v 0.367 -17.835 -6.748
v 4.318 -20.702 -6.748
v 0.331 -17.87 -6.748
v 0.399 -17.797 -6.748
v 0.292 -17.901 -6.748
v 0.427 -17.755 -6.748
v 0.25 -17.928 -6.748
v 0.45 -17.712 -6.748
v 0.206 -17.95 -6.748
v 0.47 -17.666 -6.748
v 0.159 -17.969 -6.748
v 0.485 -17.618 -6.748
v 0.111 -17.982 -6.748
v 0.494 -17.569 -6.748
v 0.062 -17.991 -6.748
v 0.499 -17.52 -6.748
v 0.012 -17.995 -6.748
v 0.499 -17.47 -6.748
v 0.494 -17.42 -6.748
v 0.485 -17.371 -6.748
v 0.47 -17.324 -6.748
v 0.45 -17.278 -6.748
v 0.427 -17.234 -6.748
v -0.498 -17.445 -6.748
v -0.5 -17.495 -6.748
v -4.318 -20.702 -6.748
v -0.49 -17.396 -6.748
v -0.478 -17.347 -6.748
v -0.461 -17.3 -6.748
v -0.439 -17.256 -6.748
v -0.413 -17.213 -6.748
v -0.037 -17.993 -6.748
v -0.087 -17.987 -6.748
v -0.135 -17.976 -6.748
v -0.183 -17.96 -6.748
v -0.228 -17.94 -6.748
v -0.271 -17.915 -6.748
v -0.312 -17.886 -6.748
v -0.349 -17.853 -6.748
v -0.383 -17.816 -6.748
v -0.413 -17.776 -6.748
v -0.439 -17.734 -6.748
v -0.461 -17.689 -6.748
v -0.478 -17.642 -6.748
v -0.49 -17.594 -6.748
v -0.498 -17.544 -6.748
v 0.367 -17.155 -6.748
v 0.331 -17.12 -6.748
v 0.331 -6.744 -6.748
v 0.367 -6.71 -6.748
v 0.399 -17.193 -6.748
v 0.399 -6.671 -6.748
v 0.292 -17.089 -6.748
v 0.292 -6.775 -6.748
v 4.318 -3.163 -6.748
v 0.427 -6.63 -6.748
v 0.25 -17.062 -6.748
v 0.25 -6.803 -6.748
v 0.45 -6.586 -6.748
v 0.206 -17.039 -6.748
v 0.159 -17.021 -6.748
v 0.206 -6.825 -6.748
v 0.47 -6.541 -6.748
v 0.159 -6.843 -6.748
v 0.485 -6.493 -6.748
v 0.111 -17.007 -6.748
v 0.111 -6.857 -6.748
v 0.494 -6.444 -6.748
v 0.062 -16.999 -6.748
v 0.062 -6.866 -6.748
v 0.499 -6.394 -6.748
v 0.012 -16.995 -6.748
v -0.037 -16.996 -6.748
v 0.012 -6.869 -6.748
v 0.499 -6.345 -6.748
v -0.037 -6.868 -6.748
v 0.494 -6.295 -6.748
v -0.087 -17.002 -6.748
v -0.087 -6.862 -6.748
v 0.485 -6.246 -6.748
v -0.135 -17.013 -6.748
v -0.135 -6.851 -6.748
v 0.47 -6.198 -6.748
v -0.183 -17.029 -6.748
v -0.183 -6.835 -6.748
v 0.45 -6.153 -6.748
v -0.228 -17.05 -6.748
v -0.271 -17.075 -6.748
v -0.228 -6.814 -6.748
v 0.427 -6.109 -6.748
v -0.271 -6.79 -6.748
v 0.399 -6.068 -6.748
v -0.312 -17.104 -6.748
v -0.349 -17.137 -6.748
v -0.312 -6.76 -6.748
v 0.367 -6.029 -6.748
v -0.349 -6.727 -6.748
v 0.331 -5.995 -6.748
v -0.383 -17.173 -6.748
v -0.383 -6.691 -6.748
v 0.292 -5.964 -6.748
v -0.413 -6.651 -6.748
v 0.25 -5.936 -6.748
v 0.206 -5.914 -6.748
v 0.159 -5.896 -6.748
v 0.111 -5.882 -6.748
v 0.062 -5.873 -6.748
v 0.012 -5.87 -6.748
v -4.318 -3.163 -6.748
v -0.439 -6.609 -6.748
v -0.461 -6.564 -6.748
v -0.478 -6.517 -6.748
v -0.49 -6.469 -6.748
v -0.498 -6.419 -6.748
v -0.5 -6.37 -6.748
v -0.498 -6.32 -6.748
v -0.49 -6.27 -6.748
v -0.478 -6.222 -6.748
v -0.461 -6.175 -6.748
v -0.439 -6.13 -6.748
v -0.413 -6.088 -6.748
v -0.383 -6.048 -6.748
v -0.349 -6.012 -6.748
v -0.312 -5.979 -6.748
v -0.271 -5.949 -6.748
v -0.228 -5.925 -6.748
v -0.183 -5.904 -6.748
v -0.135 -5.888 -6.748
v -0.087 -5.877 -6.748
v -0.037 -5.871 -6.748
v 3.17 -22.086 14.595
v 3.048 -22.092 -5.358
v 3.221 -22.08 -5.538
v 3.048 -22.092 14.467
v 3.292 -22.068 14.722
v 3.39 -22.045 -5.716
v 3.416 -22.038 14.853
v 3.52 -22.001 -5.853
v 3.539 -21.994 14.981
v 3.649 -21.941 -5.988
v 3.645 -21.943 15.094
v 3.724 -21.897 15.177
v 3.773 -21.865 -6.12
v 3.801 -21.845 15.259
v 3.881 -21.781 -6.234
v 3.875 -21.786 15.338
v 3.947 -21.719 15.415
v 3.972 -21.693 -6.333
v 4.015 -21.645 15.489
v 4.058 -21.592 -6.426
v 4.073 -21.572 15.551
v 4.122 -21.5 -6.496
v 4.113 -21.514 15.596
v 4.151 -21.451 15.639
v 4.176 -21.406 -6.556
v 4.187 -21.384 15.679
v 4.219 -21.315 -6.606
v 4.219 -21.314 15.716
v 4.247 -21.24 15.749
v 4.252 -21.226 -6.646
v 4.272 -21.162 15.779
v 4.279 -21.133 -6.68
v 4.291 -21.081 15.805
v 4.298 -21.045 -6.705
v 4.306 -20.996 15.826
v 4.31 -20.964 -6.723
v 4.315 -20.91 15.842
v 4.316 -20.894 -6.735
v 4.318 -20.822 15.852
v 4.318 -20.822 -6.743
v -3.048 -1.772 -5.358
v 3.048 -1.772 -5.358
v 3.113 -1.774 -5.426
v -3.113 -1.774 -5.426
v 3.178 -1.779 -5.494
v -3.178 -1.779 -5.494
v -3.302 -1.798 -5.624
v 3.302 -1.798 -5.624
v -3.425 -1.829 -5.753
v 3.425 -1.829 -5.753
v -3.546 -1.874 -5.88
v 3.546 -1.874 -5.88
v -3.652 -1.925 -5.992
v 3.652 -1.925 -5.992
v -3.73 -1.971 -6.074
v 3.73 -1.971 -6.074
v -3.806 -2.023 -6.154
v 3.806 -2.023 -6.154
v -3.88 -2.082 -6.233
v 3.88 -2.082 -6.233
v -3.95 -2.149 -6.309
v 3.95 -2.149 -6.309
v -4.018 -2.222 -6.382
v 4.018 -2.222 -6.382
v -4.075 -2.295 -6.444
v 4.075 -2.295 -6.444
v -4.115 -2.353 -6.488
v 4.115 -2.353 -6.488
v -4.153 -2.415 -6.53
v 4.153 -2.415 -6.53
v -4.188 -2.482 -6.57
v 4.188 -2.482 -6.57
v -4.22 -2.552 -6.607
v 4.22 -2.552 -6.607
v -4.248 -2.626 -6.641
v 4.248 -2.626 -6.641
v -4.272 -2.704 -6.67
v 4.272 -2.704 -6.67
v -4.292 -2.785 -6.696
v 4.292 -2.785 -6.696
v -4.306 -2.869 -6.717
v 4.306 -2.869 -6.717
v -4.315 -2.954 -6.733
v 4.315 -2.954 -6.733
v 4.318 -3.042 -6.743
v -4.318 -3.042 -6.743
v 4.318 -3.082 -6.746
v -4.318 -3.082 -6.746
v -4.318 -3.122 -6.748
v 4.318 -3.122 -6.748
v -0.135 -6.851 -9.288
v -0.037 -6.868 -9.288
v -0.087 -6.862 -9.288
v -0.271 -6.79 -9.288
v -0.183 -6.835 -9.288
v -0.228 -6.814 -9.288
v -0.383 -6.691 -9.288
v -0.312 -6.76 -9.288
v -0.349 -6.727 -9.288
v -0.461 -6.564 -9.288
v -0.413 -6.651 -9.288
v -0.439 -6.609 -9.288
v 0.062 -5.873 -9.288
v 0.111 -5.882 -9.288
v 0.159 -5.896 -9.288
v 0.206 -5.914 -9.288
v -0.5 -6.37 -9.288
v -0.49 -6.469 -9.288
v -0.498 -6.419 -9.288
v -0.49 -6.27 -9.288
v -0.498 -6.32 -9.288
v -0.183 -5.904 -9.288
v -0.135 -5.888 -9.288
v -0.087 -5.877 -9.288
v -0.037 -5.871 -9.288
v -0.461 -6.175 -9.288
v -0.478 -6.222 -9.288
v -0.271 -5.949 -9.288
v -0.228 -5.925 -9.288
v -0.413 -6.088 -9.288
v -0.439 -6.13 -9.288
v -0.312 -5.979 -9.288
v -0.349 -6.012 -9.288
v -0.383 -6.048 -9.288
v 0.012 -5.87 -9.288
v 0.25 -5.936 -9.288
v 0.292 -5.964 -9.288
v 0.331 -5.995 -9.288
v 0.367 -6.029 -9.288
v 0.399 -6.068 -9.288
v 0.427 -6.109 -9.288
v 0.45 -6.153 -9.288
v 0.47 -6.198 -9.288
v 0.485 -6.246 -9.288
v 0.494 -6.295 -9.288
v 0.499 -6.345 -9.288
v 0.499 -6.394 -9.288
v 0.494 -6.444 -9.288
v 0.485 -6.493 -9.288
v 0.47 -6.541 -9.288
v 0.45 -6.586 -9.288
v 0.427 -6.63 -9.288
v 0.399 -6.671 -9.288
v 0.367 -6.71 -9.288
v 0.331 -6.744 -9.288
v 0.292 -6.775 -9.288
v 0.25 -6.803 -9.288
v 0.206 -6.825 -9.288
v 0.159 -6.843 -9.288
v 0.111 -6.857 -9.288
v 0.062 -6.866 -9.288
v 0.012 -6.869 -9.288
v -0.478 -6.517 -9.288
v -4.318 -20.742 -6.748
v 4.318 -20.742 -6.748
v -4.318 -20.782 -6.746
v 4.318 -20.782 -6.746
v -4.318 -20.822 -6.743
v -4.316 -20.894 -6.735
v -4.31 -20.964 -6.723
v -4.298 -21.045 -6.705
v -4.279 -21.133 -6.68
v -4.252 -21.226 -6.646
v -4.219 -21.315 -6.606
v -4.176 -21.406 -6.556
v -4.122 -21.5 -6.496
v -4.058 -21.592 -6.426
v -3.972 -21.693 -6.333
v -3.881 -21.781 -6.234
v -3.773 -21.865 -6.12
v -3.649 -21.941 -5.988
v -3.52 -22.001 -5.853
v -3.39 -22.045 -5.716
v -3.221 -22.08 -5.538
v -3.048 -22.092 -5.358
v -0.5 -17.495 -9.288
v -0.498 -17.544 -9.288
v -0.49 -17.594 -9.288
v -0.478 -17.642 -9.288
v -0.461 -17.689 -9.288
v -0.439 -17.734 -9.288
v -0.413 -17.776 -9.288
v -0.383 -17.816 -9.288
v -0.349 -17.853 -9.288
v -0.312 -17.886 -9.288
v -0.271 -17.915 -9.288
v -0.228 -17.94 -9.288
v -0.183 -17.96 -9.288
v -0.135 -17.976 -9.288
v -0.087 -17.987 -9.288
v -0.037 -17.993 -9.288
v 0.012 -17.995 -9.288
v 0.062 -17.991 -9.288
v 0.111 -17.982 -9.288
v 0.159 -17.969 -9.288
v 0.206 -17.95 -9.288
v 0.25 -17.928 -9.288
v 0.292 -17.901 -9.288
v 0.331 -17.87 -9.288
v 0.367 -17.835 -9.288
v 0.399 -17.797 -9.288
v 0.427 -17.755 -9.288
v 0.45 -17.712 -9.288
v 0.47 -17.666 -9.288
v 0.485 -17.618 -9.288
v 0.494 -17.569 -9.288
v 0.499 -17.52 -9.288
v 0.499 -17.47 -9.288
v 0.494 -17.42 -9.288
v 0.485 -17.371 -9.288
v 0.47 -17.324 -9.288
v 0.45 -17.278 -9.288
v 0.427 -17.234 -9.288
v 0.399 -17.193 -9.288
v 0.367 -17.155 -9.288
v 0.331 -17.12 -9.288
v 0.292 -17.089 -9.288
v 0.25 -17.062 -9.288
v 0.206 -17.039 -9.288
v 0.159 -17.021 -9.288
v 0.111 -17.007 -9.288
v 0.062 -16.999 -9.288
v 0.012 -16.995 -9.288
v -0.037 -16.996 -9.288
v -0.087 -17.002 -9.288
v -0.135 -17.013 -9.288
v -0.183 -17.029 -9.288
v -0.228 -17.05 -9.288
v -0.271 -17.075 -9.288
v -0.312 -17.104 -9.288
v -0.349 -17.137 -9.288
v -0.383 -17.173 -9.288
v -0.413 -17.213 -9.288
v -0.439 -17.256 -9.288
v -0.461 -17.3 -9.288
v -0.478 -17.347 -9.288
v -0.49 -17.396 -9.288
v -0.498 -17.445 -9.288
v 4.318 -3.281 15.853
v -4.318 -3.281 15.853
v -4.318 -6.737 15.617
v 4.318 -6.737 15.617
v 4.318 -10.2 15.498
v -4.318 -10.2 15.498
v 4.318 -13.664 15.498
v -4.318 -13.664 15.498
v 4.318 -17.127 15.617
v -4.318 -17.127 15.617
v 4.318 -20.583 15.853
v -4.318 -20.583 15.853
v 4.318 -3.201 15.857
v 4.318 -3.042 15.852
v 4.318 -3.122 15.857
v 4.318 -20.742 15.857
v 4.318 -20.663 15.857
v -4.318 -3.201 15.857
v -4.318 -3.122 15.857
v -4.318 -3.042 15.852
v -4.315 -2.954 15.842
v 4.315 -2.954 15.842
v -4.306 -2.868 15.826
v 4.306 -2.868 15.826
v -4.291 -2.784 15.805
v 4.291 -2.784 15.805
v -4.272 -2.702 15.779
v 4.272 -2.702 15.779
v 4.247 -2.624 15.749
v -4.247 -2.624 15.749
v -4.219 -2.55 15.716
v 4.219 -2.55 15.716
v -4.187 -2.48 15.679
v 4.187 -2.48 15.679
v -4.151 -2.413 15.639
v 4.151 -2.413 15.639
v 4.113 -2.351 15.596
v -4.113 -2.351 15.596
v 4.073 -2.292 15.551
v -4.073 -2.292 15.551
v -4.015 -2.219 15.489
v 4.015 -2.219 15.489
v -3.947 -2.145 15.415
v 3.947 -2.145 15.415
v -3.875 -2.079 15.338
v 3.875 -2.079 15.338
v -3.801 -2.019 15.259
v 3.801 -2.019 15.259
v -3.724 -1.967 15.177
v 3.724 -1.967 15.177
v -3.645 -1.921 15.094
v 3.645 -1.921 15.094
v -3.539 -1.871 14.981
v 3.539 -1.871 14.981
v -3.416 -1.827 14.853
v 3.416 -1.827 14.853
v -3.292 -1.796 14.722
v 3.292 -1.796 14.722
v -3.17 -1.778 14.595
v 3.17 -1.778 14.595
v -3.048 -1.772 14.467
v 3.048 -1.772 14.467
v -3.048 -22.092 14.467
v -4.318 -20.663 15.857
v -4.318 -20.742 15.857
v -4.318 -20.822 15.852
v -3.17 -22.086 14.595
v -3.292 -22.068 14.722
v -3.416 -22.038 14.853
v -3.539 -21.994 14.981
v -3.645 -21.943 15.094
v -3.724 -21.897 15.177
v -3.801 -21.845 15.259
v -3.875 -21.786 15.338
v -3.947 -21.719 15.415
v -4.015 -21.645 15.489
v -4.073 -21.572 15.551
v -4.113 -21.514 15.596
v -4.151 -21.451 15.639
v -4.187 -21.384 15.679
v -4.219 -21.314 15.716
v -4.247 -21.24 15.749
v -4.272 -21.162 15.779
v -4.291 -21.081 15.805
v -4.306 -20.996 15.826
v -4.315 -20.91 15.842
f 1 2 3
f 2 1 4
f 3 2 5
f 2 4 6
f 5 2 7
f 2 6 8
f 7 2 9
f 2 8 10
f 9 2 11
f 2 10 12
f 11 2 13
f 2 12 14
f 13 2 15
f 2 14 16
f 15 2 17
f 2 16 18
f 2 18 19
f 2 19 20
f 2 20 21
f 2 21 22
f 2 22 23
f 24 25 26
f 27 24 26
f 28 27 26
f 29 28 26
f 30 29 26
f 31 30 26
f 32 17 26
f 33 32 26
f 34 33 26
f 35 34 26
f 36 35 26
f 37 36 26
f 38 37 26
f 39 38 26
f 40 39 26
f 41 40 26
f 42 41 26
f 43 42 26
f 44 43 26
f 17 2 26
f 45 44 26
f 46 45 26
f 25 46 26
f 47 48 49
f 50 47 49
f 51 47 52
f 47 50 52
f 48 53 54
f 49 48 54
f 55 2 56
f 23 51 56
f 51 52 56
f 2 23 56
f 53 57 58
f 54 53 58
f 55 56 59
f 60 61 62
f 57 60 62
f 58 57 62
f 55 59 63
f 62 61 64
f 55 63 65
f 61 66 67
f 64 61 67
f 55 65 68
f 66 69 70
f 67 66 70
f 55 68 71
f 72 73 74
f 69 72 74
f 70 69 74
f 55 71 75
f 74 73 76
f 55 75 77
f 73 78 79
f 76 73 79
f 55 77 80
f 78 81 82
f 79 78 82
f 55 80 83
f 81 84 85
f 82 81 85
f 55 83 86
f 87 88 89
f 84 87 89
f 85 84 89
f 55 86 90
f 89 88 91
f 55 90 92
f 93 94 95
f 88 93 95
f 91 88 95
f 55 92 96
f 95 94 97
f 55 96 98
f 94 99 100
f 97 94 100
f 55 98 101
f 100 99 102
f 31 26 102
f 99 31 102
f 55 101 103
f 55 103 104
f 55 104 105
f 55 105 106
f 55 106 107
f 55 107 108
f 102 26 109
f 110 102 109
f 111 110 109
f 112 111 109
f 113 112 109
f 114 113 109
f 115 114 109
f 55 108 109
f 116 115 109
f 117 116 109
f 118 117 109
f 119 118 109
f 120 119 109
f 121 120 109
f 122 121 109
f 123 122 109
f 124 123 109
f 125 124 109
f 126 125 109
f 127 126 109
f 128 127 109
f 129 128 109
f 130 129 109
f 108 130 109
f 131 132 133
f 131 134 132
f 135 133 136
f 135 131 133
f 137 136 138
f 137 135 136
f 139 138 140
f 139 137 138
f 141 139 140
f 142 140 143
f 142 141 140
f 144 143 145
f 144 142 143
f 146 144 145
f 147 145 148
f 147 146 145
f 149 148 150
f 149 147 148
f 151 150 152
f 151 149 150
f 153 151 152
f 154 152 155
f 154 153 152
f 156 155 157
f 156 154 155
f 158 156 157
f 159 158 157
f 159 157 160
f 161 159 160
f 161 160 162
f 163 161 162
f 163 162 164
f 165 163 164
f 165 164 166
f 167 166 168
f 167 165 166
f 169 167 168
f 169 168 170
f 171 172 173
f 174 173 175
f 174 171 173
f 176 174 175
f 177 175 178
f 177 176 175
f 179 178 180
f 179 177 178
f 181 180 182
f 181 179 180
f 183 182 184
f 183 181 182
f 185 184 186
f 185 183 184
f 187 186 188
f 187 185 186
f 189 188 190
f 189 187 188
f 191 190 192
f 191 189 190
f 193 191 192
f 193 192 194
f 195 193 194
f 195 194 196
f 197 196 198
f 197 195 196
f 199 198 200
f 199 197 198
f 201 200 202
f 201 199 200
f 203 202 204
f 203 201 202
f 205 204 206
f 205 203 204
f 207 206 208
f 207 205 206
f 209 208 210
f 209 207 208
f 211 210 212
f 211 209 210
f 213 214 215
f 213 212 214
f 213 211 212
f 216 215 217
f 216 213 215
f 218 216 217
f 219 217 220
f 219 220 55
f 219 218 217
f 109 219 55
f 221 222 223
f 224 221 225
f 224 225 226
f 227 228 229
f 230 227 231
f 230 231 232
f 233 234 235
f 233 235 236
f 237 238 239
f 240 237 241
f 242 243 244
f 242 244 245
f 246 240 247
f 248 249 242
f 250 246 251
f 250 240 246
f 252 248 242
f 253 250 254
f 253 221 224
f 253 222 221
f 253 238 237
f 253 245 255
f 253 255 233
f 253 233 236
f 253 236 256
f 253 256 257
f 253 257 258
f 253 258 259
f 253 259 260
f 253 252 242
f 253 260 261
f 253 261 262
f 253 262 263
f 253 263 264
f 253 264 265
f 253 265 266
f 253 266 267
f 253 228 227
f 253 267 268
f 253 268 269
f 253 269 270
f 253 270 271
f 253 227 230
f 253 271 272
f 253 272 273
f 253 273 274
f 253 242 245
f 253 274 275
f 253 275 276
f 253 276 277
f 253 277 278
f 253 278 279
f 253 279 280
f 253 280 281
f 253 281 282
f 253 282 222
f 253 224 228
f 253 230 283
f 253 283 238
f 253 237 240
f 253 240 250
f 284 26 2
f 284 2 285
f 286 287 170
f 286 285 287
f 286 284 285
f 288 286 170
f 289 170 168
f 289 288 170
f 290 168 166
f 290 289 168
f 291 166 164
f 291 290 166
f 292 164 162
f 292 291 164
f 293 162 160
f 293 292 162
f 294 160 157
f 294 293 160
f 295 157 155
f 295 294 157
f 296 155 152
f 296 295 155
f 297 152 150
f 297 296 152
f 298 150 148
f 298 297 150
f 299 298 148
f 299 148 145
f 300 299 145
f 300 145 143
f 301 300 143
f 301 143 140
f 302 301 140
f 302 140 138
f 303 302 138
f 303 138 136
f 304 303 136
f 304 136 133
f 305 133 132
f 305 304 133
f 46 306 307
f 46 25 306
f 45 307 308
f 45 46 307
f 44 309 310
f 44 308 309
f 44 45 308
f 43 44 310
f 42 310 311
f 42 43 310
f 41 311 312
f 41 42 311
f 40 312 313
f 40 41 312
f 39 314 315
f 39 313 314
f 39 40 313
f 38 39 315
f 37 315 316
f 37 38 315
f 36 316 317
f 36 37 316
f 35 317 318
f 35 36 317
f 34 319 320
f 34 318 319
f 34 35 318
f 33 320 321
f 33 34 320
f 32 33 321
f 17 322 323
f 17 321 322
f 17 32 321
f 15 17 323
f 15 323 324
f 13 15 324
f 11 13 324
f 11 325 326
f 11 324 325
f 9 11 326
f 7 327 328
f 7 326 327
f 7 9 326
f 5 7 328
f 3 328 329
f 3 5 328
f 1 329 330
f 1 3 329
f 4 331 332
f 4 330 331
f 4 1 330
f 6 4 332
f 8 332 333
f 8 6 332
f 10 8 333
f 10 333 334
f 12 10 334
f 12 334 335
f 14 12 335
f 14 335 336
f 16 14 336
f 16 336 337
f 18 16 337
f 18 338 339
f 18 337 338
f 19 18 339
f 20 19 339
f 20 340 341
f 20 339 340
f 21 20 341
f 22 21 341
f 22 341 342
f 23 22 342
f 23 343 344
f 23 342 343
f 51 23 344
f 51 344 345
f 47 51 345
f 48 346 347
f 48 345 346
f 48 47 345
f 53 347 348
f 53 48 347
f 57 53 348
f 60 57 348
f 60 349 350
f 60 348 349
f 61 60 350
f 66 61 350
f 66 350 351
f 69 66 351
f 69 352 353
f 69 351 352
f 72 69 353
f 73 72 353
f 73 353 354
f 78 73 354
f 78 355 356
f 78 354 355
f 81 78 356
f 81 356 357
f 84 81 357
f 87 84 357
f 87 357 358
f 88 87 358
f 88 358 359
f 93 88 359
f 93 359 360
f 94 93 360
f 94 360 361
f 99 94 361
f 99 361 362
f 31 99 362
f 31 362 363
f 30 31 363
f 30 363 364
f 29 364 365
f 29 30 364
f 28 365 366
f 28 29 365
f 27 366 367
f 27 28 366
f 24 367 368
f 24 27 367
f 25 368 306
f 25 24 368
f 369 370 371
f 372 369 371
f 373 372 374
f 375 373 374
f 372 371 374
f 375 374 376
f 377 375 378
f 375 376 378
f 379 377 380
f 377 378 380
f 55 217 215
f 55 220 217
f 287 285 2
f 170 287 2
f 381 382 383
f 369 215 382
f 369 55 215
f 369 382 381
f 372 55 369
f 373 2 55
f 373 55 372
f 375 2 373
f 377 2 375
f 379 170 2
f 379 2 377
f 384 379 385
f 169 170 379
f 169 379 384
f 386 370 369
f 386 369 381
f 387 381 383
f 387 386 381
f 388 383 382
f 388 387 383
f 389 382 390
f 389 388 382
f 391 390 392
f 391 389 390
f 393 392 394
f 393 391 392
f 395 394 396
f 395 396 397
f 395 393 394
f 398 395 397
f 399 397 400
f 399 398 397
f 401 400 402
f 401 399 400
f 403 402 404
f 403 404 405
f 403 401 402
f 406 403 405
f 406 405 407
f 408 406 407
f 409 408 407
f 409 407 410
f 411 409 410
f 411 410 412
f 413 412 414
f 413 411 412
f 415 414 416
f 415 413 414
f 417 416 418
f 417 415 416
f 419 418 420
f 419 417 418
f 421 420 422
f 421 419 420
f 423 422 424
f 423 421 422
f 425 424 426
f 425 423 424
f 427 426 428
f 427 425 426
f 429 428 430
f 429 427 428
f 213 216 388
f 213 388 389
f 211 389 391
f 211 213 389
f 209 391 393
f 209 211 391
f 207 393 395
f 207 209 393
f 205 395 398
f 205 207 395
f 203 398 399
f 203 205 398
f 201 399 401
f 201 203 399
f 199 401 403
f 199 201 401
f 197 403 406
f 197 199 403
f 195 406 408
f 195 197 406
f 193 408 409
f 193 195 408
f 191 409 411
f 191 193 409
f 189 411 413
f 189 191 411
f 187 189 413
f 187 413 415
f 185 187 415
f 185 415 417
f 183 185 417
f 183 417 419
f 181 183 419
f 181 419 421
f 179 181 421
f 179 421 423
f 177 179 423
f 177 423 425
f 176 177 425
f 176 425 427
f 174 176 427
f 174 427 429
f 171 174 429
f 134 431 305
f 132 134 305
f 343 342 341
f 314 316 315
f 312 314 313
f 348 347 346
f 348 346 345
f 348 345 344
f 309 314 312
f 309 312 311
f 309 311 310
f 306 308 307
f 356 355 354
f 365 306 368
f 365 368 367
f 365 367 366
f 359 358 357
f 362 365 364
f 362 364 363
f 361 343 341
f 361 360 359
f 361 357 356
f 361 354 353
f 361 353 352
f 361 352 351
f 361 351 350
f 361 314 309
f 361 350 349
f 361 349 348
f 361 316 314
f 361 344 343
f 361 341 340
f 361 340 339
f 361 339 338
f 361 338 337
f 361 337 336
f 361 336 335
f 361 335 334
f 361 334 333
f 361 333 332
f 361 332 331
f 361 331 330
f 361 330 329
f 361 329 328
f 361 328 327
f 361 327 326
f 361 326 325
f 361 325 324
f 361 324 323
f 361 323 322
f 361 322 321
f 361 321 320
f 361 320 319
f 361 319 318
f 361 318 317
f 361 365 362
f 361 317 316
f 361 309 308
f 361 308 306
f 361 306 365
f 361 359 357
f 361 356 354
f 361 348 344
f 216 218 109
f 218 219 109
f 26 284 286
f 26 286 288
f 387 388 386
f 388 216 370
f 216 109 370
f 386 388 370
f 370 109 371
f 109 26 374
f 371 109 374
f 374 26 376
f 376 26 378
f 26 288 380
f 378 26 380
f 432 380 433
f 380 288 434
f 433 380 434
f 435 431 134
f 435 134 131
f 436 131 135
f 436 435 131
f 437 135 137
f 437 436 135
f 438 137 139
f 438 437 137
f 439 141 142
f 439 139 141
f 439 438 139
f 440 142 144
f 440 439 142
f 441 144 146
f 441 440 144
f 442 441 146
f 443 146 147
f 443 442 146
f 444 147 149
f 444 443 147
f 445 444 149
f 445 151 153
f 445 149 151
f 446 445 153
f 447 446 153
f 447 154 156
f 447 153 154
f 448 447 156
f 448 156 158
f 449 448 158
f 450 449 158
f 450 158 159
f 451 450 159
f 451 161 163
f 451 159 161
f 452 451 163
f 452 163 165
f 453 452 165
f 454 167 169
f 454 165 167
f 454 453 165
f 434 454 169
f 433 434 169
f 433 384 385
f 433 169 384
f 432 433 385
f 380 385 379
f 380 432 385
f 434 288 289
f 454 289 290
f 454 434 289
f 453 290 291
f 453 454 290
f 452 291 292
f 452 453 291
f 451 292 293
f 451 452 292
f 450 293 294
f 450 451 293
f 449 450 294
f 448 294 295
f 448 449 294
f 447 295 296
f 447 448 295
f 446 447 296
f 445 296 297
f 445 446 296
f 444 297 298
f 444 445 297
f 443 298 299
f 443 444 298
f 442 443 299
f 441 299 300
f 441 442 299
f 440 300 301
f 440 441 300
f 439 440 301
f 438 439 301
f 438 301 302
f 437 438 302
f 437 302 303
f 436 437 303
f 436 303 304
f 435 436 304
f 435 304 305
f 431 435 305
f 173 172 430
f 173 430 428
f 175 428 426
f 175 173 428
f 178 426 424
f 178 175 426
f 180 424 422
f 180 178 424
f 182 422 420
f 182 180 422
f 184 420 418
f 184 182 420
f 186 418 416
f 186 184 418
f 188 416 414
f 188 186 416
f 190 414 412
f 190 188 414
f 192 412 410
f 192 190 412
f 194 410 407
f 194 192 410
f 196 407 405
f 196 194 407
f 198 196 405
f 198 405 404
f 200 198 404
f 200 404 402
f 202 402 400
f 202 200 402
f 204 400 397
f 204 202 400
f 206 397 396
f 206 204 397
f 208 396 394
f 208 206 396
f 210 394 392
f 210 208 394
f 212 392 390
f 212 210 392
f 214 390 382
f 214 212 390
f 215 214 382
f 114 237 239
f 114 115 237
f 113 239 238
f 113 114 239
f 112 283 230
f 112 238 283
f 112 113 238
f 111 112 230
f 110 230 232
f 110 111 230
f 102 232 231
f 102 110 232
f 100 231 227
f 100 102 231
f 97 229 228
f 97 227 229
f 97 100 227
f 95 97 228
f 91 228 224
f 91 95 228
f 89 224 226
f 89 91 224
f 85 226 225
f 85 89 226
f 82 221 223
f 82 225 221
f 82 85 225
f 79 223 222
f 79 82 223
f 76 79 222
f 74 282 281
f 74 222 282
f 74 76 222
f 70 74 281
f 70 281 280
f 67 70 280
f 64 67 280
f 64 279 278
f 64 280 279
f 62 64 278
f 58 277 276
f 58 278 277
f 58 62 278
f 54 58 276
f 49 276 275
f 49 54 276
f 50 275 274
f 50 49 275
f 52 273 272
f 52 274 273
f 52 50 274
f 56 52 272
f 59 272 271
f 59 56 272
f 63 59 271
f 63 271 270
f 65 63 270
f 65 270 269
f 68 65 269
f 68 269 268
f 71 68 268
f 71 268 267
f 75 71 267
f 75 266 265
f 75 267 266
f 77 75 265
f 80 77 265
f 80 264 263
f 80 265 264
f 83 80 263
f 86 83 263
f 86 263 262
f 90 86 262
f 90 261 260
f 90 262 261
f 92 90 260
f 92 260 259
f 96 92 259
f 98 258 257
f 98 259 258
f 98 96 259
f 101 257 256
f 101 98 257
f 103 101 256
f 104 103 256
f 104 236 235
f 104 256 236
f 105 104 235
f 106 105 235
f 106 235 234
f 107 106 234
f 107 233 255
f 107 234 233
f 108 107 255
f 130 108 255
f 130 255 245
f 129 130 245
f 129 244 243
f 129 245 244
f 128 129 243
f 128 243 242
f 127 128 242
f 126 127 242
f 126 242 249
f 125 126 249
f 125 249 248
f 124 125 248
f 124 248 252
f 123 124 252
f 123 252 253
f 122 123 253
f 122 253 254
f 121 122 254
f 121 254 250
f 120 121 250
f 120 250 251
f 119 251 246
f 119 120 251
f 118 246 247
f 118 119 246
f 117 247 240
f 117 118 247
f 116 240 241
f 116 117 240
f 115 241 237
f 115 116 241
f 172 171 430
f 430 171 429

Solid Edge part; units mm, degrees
sketch "Sketch1" plane through (0, 0, 0) normal (1, 0, 0) x (0, 1, 0)
  line L0 (-22.0921, 14.4671) -> (-22.0921, -5.3577)
  arc A0 (-22.0921, -5.3577) -> (-20.7015, -6.7483) centre (-20.7015, -5.3577) ccw
  line L1 (-20.7015, -6.7483) -> (-3.1627, -6.7483)
  arc A1 (-1.7721, -5.3577) -> (-3.1627, -6.7483) centre (-3.1627, -5.3577) cw
  line L2 (-1.7721, -5.3577) -> (-1.7721, 14.4671)
  arc A2 (-3.2811, 15.8527) -> (-1.7721, 14.4671) centre (-3.1627, 14.4671) cw
  arc A3 (-20.5831, 15.8527) -> (-22.0921, 14.4671) centre (-20.7015, 14.4671) ccw
  arc A4 (-3.2811, 15.8527) -> (-20.5831, 15.8527) centre (-11.9321, 117.0837) cw
extrude "Protrusion1" add sketch "Sketch1" along normal mid plane 8.636
fillet "Round_1" radius 1.27 4 edges at (4.318, -22.0921, 4.5547) (-4.318, -22.0921, 4.5547) (4.318, -1.7721, 4.5547) (-4.318, -1.7721, 4.5547)
sketch "Sketch2" plane through (0, -11.6781, -6.7483) normal (0, 0, -1) x (-1, 0, 0)
  circle A0 centre (0, 5.3086) radius 0.5
  circle A1 centre (0, -5.8166) radius 0.5
  dimension "D1" = 11.1252
extrude "ExtrudedProtrusion_2" add sketch "Sketch2" along normal blind 2.54
